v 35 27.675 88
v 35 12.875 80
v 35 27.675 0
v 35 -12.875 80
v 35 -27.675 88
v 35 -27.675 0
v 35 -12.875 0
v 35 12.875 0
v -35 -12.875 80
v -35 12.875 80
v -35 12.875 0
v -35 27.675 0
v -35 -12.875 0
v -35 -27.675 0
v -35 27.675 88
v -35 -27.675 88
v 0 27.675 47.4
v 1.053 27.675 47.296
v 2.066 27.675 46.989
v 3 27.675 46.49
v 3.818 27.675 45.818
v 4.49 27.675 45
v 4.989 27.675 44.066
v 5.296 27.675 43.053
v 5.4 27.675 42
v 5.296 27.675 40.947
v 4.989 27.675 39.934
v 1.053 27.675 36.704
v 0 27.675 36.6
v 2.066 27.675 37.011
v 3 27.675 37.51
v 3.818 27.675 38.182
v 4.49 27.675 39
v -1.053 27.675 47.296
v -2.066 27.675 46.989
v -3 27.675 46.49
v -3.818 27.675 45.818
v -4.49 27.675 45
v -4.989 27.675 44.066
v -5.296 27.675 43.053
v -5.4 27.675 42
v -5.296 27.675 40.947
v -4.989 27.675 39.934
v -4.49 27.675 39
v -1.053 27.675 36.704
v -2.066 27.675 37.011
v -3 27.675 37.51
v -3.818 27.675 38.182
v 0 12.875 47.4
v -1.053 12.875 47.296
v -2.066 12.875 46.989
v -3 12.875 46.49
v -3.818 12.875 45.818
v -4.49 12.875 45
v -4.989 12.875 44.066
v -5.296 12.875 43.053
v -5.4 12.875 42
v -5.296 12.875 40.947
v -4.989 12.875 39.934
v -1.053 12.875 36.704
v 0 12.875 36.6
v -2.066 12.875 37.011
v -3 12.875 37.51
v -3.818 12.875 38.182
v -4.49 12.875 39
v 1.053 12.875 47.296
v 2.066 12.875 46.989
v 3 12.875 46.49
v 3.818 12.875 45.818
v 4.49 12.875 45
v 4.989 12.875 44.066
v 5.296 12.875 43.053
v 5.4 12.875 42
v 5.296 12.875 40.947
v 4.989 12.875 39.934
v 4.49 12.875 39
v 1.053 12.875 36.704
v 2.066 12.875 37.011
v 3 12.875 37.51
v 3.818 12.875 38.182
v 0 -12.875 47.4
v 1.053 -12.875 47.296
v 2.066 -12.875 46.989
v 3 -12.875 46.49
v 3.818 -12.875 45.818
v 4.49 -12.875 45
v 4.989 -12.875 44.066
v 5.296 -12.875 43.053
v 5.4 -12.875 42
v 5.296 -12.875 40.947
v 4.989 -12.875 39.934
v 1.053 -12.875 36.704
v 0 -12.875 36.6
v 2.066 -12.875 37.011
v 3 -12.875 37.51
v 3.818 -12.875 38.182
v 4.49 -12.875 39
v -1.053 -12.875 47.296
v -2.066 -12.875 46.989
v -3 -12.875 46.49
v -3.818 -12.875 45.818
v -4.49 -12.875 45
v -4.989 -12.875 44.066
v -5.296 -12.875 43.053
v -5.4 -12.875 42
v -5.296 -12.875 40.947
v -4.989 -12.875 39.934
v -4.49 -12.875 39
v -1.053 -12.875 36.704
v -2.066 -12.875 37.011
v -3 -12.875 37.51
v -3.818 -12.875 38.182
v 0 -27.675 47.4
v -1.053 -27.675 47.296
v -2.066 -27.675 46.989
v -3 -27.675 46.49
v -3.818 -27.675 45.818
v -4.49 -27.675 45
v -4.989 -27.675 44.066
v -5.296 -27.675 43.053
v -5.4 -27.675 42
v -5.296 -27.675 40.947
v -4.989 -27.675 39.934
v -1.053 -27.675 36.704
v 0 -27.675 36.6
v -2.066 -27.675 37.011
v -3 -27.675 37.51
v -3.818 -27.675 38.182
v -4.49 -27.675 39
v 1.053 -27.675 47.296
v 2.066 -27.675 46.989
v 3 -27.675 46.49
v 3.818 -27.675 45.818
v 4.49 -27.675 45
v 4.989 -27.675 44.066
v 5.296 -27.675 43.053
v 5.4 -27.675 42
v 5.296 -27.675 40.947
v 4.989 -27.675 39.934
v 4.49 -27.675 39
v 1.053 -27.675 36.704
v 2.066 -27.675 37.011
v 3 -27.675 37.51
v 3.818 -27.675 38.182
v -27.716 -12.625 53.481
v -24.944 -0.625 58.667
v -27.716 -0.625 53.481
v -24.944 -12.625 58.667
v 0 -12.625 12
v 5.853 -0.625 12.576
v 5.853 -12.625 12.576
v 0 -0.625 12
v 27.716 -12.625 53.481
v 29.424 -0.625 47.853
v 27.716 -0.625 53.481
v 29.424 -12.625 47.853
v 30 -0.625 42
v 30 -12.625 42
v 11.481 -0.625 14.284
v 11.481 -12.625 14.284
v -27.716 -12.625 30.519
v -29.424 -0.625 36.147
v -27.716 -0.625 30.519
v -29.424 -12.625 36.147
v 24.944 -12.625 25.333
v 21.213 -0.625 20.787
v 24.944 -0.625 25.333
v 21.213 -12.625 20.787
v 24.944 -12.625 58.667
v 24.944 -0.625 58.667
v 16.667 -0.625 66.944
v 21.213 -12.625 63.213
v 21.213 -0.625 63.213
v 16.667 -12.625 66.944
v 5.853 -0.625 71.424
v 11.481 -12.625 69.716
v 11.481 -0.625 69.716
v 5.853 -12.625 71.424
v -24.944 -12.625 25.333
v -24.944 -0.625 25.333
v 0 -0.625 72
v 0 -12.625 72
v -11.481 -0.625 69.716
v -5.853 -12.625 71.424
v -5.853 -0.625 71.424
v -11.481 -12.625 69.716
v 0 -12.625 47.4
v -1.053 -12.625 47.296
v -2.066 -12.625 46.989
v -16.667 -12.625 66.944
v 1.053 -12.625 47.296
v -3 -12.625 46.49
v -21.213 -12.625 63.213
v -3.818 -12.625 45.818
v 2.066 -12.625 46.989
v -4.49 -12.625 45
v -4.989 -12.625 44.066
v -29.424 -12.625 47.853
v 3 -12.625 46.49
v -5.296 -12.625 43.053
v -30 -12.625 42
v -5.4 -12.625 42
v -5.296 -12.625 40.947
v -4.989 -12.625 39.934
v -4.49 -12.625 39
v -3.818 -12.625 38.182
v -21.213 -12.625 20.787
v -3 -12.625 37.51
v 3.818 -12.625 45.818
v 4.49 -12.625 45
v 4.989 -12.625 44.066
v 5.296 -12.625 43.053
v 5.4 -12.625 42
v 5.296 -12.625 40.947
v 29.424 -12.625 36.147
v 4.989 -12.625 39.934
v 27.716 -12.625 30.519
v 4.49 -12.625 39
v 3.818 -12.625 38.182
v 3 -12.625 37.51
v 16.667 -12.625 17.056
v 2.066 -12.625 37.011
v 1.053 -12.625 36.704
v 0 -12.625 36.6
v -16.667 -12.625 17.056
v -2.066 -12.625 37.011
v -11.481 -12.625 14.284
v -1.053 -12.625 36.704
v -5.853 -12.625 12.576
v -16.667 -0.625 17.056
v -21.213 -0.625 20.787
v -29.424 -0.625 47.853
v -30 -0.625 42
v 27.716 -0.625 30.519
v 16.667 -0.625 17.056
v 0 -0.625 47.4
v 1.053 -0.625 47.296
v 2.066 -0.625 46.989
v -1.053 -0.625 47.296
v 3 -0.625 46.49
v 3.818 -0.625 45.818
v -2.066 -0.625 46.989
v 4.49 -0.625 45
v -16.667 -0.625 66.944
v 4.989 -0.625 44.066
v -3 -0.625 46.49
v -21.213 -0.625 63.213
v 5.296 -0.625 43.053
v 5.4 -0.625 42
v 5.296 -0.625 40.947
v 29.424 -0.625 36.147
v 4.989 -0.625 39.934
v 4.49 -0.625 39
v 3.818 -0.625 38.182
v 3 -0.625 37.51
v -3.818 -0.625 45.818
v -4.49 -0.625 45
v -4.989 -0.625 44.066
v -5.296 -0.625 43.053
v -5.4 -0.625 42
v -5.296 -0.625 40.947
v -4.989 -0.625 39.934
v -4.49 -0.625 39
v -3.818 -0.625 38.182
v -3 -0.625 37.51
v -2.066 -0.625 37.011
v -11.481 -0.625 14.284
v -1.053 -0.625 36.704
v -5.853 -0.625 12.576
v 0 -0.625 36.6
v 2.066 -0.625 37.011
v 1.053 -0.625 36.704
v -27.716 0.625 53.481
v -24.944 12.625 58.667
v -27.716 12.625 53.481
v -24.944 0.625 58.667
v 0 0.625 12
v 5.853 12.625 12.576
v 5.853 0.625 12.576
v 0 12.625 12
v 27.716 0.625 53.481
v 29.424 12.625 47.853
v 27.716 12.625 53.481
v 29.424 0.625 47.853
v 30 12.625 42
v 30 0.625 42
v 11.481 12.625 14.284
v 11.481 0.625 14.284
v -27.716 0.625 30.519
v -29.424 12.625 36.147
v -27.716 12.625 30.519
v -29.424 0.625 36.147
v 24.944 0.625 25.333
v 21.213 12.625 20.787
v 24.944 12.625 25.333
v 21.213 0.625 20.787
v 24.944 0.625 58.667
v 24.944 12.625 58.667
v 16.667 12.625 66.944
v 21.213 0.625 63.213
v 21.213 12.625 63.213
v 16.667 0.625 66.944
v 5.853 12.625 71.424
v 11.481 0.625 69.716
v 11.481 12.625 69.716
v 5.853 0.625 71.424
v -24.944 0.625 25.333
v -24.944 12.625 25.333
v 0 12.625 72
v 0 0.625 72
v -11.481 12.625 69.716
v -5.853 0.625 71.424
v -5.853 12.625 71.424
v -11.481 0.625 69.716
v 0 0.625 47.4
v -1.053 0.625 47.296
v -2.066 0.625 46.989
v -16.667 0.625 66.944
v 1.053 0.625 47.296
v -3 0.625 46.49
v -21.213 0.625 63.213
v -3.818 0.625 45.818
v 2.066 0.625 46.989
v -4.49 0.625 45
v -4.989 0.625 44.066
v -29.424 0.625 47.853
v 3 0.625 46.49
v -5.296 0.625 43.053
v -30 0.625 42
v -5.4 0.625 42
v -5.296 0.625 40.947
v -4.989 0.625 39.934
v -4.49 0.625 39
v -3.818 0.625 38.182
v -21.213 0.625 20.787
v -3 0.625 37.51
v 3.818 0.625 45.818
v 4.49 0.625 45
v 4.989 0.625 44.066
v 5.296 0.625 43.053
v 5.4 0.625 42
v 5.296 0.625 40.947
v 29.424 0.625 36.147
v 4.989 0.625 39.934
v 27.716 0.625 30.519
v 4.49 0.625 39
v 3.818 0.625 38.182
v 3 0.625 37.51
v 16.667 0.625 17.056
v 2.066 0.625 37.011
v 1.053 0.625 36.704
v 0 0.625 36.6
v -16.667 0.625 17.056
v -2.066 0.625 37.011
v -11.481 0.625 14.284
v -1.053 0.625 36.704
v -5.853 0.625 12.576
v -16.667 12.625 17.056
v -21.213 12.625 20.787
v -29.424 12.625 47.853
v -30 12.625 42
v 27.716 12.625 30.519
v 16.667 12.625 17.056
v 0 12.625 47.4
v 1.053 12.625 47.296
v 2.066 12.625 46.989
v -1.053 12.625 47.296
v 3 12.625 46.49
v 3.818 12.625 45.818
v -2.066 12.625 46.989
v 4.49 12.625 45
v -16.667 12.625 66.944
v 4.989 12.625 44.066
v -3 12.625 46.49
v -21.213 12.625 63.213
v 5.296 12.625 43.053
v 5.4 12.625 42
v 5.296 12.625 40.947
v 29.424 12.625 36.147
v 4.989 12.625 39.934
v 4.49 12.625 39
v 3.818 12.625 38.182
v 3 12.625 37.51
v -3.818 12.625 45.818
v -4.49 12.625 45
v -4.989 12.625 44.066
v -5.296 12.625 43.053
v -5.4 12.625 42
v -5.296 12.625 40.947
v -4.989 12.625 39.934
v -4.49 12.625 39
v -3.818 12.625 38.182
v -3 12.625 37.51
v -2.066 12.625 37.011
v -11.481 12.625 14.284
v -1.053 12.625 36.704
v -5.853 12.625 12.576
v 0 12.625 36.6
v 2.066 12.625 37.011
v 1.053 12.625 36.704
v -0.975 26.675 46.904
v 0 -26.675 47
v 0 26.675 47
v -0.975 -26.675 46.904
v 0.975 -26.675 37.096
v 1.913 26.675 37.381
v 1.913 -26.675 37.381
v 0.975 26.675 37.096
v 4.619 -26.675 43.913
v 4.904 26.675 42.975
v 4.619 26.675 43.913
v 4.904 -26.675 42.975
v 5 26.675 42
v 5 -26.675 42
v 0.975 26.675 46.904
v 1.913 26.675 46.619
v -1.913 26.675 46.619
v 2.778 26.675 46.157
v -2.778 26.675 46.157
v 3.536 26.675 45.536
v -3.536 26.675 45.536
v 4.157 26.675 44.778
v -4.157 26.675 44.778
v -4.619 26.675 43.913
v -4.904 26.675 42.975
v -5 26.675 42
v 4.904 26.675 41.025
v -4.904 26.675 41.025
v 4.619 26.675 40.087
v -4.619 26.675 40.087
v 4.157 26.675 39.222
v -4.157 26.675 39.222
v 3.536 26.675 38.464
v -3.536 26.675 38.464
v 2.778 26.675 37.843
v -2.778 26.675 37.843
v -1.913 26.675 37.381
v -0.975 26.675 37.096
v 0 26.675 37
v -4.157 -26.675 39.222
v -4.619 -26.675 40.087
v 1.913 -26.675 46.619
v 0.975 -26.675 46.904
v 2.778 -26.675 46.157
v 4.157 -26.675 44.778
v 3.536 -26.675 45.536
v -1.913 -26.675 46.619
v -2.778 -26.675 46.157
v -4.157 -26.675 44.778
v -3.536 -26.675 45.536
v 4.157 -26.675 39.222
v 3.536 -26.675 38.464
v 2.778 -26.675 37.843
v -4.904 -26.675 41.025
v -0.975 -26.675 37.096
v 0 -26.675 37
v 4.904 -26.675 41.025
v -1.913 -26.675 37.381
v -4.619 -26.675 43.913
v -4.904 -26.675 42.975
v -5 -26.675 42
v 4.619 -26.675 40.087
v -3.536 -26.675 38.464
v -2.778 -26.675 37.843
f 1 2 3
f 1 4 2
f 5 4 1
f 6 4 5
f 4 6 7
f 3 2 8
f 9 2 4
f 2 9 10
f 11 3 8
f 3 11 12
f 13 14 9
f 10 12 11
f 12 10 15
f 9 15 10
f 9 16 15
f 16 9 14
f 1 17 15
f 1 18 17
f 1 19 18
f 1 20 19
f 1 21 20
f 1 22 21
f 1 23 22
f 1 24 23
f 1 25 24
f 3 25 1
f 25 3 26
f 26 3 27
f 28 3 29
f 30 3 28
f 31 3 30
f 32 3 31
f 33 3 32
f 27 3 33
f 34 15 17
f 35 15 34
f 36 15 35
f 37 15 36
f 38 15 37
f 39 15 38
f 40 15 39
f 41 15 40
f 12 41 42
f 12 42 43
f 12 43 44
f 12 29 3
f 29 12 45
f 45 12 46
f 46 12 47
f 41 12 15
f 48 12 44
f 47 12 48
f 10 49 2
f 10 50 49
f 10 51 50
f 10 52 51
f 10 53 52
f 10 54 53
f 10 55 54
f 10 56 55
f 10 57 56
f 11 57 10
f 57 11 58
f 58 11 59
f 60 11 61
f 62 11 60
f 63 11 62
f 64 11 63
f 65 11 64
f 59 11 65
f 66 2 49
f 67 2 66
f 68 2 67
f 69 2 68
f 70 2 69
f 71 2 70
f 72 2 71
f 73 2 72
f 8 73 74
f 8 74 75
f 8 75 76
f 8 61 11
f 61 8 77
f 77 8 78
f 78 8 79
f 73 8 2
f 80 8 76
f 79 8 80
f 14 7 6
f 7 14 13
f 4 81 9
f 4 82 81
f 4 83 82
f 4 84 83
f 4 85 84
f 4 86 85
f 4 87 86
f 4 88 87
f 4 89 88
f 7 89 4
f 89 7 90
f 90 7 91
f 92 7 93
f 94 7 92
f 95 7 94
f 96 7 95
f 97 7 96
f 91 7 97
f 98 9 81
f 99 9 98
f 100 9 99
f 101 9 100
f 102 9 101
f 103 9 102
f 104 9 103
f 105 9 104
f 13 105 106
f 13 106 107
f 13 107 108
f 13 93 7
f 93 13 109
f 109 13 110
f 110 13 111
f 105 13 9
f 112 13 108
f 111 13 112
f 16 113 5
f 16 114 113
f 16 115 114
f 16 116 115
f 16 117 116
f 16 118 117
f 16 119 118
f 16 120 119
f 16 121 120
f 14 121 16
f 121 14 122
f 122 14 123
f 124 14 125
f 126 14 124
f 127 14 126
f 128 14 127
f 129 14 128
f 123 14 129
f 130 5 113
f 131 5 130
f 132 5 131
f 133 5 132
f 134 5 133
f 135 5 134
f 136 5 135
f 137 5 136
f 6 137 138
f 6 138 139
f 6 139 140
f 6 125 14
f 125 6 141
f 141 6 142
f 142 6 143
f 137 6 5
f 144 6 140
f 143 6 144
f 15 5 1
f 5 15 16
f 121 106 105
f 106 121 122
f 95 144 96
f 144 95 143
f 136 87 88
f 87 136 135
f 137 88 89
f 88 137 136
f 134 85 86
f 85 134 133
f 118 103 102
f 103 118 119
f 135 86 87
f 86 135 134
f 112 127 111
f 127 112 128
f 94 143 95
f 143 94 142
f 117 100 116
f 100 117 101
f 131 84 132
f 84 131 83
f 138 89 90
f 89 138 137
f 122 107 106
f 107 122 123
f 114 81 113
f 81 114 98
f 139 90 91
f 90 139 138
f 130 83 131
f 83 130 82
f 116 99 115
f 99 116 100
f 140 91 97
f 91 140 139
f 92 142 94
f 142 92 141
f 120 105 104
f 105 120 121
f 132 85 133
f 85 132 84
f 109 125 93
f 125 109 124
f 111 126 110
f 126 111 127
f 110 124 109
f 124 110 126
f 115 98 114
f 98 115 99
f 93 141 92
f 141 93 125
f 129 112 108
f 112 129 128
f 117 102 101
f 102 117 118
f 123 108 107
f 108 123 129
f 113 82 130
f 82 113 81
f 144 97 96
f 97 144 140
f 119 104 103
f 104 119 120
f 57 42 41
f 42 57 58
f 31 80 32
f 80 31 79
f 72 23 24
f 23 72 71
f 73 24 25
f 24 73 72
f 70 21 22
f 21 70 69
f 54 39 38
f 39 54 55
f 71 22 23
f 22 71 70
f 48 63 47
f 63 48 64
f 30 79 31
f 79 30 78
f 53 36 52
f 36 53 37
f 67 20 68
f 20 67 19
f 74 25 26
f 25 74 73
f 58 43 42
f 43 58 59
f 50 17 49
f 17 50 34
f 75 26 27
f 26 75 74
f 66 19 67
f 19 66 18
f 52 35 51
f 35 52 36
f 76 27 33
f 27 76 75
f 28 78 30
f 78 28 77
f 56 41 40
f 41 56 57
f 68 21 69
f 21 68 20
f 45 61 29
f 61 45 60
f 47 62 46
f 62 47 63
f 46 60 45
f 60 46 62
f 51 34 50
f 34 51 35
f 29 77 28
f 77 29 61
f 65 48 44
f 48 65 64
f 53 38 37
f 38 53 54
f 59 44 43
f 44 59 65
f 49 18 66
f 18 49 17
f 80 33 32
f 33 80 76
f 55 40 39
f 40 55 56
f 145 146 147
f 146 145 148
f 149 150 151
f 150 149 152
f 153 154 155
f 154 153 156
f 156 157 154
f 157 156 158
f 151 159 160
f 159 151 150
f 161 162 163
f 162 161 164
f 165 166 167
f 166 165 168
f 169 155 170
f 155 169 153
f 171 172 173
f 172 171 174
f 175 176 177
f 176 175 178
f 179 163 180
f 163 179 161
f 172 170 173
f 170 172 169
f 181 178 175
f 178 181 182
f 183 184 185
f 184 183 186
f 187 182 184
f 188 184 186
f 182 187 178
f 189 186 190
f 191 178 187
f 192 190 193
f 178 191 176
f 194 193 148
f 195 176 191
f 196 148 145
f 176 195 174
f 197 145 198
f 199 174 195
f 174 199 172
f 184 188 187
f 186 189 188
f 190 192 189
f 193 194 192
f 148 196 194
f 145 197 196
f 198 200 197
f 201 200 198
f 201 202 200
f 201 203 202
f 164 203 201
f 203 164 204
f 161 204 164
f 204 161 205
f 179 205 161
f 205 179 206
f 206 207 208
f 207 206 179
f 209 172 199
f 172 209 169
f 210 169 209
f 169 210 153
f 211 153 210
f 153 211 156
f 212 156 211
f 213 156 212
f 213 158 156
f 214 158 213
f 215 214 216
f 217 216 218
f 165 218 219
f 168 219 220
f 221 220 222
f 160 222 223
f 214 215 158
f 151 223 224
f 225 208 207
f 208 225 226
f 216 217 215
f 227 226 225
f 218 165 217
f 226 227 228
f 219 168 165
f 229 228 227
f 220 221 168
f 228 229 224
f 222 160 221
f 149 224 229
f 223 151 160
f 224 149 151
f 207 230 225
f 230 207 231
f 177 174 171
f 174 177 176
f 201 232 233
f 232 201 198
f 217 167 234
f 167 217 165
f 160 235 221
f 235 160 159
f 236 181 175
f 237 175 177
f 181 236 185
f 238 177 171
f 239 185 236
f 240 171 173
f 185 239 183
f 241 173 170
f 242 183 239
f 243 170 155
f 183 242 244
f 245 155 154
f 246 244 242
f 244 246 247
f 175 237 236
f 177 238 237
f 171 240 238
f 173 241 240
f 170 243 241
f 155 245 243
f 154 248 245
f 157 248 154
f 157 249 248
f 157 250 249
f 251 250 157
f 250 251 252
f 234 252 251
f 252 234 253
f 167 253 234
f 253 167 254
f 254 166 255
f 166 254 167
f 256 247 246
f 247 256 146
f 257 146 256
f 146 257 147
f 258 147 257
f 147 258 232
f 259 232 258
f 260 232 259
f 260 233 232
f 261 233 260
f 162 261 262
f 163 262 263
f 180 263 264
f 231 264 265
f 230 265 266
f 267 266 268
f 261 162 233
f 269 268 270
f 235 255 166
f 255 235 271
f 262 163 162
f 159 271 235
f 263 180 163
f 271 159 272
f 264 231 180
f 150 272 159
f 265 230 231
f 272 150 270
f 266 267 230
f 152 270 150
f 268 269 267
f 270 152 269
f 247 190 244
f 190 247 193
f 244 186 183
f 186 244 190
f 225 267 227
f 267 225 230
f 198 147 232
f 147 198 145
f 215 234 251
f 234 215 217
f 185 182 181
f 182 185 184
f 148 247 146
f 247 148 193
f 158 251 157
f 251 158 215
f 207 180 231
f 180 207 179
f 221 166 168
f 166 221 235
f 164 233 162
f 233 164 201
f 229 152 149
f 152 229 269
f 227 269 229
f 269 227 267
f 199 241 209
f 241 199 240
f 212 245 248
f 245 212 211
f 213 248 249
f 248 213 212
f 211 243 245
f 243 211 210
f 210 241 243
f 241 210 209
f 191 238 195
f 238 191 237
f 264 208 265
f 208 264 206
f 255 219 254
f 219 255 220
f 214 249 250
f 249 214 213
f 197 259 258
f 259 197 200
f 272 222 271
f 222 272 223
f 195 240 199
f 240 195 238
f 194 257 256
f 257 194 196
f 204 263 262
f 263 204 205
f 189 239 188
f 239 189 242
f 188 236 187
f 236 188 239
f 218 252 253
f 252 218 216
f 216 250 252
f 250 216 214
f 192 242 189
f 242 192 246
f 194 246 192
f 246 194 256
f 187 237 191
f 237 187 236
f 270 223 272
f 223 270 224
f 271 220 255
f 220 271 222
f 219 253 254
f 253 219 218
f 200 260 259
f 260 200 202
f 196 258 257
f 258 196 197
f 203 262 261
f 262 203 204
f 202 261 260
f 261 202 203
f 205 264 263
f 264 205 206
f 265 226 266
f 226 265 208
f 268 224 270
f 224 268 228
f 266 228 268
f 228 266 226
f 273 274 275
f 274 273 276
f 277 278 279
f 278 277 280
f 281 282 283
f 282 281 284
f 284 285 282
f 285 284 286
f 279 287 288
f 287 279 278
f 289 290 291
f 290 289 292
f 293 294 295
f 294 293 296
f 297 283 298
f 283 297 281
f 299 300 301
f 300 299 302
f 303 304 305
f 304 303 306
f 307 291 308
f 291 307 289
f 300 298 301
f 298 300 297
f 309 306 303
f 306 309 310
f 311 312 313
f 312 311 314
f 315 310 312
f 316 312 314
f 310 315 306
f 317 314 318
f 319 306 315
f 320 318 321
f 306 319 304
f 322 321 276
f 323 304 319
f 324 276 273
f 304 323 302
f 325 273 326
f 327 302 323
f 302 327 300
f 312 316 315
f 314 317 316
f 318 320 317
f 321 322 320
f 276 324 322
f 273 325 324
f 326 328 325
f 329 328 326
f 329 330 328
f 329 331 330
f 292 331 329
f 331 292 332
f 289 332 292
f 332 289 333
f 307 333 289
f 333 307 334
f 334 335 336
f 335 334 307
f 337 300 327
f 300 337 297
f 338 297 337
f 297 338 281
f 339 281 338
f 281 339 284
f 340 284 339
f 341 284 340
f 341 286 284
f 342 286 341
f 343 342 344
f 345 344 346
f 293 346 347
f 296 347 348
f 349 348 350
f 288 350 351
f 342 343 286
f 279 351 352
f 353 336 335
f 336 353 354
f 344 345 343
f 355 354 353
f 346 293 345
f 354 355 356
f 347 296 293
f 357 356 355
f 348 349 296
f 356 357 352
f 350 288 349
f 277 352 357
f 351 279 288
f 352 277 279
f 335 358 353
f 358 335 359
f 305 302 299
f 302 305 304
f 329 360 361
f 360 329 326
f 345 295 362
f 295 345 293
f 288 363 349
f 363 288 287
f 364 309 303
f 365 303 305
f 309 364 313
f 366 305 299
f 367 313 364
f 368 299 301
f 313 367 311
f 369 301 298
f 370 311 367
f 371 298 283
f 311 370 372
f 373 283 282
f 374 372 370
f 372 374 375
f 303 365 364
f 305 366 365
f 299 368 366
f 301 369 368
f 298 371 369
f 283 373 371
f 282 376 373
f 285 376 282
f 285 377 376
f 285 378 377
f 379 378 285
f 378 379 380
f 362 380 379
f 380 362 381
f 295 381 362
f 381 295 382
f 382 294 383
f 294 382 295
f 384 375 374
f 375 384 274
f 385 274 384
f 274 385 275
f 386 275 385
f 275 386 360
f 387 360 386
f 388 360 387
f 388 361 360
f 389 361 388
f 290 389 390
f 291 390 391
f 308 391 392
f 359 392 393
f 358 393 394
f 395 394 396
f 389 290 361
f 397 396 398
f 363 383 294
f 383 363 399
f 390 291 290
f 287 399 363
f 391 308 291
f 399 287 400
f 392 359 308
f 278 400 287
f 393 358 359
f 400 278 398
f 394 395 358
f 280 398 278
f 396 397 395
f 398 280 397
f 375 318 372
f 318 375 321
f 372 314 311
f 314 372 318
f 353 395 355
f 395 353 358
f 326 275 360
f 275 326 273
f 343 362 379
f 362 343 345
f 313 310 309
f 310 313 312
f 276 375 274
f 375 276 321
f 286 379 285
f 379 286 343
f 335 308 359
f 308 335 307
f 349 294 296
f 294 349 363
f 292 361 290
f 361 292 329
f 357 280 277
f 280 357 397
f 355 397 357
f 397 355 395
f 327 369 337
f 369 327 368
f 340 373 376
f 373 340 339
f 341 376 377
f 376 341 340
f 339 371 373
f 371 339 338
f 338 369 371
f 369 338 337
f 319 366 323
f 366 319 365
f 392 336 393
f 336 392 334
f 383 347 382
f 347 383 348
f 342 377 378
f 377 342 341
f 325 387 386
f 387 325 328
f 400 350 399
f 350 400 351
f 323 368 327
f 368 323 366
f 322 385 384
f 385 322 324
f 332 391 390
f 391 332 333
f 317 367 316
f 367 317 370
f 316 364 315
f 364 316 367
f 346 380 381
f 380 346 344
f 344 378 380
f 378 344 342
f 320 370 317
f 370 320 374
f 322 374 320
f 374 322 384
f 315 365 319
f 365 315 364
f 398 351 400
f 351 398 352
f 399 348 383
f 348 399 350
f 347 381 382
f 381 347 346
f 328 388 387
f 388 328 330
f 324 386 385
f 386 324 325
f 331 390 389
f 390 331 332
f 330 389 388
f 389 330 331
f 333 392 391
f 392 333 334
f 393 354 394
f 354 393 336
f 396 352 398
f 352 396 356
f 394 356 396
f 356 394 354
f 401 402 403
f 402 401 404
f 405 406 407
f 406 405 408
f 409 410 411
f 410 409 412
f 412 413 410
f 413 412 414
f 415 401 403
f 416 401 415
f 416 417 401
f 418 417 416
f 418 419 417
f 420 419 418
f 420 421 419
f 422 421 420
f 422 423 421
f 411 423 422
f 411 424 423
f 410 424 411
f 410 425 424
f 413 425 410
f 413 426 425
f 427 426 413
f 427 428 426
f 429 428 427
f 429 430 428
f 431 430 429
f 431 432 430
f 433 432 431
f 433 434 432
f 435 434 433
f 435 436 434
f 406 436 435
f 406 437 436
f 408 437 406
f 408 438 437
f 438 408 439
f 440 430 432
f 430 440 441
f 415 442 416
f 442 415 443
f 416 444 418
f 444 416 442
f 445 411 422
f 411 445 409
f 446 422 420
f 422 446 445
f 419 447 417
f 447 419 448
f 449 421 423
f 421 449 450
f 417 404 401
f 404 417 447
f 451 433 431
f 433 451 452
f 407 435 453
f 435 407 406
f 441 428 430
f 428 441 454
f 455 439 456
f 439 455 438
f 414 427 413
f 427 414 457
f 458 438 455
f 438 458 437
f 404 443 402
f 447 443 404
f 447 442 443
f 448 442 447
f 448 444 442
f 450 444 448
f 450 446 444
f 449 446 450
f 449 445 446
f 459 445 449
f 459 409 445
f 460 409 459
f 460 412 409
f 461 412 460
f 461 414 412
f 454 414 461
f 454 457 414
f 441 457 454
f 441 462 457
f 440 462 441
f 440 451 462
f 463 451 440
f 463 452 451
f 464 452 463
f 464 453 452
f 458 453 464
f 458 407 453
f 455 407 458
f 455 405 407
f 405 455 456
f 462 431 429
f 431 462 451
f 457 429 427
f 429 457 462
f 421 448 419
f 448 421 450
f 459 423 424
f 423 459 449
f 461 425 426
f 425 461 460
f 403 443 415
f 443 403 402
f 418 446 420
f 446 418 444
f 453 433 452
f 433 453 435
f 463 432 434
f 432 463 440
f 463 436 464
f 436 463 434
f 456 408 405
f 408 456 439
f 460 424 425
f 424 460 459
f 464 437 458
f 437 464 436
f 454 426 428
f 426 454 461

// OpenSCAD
$fn = 32;

// ------------------------------------------------------------------------
// Trolley wheel set: wheels d60, fork 80 mm tall
// Every part is its own module, assembly() places every instance.
// ------------------------------------------------------------------------

// --- part 1 ---
module trolley_fork() {
  difference() {
    union() {
      translate([-35, 12.875, 0]) cube([70, 14.8, 80]);
      translate([-35, -27.675, 0]) cube([70, 14.8, 80]);
      translate([-35, -27.675, 80]) cube([70, 55.35, 8]);
    }
    translate([0, -20.275, 42]) rotate([90, 0, 0]) cylinder(h = 16.8, d = 10.8, center = true);
    translate([0, 20.275, 42]) rotate([90, 0, 0]) cylinder(h = 16.8, d = 10.8, center = true);
  }
}

// --- part 2 ---
module trolley_wheel() {
  difference() {
      translate([0, 0, 0]) cylinder(h = 12, d = 60);
      translate([0, 0, -1]) cylinder(h = 14, d = 10.8);
    }
}

// --- part 3 ---
module trolley_axle() {
  translate([0, 0, -26.675]) cylinder(h = 53.35, d = 10);
}

// --- assembly ---
module assembly() {
  color([0.80, 0.24, 0.20]) translate([0, 0, 0]) rotate([0, 0, 0]) trolley_fork();
  color([0.20, 0.45, 0.75]) translate([0, -0.625, 42]) rotate([90, 0, 0]) trolley_wheel();
  color([0.25, 0.62, 0.32]) translate([0, 12.625, 42]) rotate([90, 0, 0]) trolley_wheel();
  color([0.92, 0.70, 0.18]) translate([0, 0, 42]) rotate([90, 0, 0]) trolley_axle();
}

assembly();
